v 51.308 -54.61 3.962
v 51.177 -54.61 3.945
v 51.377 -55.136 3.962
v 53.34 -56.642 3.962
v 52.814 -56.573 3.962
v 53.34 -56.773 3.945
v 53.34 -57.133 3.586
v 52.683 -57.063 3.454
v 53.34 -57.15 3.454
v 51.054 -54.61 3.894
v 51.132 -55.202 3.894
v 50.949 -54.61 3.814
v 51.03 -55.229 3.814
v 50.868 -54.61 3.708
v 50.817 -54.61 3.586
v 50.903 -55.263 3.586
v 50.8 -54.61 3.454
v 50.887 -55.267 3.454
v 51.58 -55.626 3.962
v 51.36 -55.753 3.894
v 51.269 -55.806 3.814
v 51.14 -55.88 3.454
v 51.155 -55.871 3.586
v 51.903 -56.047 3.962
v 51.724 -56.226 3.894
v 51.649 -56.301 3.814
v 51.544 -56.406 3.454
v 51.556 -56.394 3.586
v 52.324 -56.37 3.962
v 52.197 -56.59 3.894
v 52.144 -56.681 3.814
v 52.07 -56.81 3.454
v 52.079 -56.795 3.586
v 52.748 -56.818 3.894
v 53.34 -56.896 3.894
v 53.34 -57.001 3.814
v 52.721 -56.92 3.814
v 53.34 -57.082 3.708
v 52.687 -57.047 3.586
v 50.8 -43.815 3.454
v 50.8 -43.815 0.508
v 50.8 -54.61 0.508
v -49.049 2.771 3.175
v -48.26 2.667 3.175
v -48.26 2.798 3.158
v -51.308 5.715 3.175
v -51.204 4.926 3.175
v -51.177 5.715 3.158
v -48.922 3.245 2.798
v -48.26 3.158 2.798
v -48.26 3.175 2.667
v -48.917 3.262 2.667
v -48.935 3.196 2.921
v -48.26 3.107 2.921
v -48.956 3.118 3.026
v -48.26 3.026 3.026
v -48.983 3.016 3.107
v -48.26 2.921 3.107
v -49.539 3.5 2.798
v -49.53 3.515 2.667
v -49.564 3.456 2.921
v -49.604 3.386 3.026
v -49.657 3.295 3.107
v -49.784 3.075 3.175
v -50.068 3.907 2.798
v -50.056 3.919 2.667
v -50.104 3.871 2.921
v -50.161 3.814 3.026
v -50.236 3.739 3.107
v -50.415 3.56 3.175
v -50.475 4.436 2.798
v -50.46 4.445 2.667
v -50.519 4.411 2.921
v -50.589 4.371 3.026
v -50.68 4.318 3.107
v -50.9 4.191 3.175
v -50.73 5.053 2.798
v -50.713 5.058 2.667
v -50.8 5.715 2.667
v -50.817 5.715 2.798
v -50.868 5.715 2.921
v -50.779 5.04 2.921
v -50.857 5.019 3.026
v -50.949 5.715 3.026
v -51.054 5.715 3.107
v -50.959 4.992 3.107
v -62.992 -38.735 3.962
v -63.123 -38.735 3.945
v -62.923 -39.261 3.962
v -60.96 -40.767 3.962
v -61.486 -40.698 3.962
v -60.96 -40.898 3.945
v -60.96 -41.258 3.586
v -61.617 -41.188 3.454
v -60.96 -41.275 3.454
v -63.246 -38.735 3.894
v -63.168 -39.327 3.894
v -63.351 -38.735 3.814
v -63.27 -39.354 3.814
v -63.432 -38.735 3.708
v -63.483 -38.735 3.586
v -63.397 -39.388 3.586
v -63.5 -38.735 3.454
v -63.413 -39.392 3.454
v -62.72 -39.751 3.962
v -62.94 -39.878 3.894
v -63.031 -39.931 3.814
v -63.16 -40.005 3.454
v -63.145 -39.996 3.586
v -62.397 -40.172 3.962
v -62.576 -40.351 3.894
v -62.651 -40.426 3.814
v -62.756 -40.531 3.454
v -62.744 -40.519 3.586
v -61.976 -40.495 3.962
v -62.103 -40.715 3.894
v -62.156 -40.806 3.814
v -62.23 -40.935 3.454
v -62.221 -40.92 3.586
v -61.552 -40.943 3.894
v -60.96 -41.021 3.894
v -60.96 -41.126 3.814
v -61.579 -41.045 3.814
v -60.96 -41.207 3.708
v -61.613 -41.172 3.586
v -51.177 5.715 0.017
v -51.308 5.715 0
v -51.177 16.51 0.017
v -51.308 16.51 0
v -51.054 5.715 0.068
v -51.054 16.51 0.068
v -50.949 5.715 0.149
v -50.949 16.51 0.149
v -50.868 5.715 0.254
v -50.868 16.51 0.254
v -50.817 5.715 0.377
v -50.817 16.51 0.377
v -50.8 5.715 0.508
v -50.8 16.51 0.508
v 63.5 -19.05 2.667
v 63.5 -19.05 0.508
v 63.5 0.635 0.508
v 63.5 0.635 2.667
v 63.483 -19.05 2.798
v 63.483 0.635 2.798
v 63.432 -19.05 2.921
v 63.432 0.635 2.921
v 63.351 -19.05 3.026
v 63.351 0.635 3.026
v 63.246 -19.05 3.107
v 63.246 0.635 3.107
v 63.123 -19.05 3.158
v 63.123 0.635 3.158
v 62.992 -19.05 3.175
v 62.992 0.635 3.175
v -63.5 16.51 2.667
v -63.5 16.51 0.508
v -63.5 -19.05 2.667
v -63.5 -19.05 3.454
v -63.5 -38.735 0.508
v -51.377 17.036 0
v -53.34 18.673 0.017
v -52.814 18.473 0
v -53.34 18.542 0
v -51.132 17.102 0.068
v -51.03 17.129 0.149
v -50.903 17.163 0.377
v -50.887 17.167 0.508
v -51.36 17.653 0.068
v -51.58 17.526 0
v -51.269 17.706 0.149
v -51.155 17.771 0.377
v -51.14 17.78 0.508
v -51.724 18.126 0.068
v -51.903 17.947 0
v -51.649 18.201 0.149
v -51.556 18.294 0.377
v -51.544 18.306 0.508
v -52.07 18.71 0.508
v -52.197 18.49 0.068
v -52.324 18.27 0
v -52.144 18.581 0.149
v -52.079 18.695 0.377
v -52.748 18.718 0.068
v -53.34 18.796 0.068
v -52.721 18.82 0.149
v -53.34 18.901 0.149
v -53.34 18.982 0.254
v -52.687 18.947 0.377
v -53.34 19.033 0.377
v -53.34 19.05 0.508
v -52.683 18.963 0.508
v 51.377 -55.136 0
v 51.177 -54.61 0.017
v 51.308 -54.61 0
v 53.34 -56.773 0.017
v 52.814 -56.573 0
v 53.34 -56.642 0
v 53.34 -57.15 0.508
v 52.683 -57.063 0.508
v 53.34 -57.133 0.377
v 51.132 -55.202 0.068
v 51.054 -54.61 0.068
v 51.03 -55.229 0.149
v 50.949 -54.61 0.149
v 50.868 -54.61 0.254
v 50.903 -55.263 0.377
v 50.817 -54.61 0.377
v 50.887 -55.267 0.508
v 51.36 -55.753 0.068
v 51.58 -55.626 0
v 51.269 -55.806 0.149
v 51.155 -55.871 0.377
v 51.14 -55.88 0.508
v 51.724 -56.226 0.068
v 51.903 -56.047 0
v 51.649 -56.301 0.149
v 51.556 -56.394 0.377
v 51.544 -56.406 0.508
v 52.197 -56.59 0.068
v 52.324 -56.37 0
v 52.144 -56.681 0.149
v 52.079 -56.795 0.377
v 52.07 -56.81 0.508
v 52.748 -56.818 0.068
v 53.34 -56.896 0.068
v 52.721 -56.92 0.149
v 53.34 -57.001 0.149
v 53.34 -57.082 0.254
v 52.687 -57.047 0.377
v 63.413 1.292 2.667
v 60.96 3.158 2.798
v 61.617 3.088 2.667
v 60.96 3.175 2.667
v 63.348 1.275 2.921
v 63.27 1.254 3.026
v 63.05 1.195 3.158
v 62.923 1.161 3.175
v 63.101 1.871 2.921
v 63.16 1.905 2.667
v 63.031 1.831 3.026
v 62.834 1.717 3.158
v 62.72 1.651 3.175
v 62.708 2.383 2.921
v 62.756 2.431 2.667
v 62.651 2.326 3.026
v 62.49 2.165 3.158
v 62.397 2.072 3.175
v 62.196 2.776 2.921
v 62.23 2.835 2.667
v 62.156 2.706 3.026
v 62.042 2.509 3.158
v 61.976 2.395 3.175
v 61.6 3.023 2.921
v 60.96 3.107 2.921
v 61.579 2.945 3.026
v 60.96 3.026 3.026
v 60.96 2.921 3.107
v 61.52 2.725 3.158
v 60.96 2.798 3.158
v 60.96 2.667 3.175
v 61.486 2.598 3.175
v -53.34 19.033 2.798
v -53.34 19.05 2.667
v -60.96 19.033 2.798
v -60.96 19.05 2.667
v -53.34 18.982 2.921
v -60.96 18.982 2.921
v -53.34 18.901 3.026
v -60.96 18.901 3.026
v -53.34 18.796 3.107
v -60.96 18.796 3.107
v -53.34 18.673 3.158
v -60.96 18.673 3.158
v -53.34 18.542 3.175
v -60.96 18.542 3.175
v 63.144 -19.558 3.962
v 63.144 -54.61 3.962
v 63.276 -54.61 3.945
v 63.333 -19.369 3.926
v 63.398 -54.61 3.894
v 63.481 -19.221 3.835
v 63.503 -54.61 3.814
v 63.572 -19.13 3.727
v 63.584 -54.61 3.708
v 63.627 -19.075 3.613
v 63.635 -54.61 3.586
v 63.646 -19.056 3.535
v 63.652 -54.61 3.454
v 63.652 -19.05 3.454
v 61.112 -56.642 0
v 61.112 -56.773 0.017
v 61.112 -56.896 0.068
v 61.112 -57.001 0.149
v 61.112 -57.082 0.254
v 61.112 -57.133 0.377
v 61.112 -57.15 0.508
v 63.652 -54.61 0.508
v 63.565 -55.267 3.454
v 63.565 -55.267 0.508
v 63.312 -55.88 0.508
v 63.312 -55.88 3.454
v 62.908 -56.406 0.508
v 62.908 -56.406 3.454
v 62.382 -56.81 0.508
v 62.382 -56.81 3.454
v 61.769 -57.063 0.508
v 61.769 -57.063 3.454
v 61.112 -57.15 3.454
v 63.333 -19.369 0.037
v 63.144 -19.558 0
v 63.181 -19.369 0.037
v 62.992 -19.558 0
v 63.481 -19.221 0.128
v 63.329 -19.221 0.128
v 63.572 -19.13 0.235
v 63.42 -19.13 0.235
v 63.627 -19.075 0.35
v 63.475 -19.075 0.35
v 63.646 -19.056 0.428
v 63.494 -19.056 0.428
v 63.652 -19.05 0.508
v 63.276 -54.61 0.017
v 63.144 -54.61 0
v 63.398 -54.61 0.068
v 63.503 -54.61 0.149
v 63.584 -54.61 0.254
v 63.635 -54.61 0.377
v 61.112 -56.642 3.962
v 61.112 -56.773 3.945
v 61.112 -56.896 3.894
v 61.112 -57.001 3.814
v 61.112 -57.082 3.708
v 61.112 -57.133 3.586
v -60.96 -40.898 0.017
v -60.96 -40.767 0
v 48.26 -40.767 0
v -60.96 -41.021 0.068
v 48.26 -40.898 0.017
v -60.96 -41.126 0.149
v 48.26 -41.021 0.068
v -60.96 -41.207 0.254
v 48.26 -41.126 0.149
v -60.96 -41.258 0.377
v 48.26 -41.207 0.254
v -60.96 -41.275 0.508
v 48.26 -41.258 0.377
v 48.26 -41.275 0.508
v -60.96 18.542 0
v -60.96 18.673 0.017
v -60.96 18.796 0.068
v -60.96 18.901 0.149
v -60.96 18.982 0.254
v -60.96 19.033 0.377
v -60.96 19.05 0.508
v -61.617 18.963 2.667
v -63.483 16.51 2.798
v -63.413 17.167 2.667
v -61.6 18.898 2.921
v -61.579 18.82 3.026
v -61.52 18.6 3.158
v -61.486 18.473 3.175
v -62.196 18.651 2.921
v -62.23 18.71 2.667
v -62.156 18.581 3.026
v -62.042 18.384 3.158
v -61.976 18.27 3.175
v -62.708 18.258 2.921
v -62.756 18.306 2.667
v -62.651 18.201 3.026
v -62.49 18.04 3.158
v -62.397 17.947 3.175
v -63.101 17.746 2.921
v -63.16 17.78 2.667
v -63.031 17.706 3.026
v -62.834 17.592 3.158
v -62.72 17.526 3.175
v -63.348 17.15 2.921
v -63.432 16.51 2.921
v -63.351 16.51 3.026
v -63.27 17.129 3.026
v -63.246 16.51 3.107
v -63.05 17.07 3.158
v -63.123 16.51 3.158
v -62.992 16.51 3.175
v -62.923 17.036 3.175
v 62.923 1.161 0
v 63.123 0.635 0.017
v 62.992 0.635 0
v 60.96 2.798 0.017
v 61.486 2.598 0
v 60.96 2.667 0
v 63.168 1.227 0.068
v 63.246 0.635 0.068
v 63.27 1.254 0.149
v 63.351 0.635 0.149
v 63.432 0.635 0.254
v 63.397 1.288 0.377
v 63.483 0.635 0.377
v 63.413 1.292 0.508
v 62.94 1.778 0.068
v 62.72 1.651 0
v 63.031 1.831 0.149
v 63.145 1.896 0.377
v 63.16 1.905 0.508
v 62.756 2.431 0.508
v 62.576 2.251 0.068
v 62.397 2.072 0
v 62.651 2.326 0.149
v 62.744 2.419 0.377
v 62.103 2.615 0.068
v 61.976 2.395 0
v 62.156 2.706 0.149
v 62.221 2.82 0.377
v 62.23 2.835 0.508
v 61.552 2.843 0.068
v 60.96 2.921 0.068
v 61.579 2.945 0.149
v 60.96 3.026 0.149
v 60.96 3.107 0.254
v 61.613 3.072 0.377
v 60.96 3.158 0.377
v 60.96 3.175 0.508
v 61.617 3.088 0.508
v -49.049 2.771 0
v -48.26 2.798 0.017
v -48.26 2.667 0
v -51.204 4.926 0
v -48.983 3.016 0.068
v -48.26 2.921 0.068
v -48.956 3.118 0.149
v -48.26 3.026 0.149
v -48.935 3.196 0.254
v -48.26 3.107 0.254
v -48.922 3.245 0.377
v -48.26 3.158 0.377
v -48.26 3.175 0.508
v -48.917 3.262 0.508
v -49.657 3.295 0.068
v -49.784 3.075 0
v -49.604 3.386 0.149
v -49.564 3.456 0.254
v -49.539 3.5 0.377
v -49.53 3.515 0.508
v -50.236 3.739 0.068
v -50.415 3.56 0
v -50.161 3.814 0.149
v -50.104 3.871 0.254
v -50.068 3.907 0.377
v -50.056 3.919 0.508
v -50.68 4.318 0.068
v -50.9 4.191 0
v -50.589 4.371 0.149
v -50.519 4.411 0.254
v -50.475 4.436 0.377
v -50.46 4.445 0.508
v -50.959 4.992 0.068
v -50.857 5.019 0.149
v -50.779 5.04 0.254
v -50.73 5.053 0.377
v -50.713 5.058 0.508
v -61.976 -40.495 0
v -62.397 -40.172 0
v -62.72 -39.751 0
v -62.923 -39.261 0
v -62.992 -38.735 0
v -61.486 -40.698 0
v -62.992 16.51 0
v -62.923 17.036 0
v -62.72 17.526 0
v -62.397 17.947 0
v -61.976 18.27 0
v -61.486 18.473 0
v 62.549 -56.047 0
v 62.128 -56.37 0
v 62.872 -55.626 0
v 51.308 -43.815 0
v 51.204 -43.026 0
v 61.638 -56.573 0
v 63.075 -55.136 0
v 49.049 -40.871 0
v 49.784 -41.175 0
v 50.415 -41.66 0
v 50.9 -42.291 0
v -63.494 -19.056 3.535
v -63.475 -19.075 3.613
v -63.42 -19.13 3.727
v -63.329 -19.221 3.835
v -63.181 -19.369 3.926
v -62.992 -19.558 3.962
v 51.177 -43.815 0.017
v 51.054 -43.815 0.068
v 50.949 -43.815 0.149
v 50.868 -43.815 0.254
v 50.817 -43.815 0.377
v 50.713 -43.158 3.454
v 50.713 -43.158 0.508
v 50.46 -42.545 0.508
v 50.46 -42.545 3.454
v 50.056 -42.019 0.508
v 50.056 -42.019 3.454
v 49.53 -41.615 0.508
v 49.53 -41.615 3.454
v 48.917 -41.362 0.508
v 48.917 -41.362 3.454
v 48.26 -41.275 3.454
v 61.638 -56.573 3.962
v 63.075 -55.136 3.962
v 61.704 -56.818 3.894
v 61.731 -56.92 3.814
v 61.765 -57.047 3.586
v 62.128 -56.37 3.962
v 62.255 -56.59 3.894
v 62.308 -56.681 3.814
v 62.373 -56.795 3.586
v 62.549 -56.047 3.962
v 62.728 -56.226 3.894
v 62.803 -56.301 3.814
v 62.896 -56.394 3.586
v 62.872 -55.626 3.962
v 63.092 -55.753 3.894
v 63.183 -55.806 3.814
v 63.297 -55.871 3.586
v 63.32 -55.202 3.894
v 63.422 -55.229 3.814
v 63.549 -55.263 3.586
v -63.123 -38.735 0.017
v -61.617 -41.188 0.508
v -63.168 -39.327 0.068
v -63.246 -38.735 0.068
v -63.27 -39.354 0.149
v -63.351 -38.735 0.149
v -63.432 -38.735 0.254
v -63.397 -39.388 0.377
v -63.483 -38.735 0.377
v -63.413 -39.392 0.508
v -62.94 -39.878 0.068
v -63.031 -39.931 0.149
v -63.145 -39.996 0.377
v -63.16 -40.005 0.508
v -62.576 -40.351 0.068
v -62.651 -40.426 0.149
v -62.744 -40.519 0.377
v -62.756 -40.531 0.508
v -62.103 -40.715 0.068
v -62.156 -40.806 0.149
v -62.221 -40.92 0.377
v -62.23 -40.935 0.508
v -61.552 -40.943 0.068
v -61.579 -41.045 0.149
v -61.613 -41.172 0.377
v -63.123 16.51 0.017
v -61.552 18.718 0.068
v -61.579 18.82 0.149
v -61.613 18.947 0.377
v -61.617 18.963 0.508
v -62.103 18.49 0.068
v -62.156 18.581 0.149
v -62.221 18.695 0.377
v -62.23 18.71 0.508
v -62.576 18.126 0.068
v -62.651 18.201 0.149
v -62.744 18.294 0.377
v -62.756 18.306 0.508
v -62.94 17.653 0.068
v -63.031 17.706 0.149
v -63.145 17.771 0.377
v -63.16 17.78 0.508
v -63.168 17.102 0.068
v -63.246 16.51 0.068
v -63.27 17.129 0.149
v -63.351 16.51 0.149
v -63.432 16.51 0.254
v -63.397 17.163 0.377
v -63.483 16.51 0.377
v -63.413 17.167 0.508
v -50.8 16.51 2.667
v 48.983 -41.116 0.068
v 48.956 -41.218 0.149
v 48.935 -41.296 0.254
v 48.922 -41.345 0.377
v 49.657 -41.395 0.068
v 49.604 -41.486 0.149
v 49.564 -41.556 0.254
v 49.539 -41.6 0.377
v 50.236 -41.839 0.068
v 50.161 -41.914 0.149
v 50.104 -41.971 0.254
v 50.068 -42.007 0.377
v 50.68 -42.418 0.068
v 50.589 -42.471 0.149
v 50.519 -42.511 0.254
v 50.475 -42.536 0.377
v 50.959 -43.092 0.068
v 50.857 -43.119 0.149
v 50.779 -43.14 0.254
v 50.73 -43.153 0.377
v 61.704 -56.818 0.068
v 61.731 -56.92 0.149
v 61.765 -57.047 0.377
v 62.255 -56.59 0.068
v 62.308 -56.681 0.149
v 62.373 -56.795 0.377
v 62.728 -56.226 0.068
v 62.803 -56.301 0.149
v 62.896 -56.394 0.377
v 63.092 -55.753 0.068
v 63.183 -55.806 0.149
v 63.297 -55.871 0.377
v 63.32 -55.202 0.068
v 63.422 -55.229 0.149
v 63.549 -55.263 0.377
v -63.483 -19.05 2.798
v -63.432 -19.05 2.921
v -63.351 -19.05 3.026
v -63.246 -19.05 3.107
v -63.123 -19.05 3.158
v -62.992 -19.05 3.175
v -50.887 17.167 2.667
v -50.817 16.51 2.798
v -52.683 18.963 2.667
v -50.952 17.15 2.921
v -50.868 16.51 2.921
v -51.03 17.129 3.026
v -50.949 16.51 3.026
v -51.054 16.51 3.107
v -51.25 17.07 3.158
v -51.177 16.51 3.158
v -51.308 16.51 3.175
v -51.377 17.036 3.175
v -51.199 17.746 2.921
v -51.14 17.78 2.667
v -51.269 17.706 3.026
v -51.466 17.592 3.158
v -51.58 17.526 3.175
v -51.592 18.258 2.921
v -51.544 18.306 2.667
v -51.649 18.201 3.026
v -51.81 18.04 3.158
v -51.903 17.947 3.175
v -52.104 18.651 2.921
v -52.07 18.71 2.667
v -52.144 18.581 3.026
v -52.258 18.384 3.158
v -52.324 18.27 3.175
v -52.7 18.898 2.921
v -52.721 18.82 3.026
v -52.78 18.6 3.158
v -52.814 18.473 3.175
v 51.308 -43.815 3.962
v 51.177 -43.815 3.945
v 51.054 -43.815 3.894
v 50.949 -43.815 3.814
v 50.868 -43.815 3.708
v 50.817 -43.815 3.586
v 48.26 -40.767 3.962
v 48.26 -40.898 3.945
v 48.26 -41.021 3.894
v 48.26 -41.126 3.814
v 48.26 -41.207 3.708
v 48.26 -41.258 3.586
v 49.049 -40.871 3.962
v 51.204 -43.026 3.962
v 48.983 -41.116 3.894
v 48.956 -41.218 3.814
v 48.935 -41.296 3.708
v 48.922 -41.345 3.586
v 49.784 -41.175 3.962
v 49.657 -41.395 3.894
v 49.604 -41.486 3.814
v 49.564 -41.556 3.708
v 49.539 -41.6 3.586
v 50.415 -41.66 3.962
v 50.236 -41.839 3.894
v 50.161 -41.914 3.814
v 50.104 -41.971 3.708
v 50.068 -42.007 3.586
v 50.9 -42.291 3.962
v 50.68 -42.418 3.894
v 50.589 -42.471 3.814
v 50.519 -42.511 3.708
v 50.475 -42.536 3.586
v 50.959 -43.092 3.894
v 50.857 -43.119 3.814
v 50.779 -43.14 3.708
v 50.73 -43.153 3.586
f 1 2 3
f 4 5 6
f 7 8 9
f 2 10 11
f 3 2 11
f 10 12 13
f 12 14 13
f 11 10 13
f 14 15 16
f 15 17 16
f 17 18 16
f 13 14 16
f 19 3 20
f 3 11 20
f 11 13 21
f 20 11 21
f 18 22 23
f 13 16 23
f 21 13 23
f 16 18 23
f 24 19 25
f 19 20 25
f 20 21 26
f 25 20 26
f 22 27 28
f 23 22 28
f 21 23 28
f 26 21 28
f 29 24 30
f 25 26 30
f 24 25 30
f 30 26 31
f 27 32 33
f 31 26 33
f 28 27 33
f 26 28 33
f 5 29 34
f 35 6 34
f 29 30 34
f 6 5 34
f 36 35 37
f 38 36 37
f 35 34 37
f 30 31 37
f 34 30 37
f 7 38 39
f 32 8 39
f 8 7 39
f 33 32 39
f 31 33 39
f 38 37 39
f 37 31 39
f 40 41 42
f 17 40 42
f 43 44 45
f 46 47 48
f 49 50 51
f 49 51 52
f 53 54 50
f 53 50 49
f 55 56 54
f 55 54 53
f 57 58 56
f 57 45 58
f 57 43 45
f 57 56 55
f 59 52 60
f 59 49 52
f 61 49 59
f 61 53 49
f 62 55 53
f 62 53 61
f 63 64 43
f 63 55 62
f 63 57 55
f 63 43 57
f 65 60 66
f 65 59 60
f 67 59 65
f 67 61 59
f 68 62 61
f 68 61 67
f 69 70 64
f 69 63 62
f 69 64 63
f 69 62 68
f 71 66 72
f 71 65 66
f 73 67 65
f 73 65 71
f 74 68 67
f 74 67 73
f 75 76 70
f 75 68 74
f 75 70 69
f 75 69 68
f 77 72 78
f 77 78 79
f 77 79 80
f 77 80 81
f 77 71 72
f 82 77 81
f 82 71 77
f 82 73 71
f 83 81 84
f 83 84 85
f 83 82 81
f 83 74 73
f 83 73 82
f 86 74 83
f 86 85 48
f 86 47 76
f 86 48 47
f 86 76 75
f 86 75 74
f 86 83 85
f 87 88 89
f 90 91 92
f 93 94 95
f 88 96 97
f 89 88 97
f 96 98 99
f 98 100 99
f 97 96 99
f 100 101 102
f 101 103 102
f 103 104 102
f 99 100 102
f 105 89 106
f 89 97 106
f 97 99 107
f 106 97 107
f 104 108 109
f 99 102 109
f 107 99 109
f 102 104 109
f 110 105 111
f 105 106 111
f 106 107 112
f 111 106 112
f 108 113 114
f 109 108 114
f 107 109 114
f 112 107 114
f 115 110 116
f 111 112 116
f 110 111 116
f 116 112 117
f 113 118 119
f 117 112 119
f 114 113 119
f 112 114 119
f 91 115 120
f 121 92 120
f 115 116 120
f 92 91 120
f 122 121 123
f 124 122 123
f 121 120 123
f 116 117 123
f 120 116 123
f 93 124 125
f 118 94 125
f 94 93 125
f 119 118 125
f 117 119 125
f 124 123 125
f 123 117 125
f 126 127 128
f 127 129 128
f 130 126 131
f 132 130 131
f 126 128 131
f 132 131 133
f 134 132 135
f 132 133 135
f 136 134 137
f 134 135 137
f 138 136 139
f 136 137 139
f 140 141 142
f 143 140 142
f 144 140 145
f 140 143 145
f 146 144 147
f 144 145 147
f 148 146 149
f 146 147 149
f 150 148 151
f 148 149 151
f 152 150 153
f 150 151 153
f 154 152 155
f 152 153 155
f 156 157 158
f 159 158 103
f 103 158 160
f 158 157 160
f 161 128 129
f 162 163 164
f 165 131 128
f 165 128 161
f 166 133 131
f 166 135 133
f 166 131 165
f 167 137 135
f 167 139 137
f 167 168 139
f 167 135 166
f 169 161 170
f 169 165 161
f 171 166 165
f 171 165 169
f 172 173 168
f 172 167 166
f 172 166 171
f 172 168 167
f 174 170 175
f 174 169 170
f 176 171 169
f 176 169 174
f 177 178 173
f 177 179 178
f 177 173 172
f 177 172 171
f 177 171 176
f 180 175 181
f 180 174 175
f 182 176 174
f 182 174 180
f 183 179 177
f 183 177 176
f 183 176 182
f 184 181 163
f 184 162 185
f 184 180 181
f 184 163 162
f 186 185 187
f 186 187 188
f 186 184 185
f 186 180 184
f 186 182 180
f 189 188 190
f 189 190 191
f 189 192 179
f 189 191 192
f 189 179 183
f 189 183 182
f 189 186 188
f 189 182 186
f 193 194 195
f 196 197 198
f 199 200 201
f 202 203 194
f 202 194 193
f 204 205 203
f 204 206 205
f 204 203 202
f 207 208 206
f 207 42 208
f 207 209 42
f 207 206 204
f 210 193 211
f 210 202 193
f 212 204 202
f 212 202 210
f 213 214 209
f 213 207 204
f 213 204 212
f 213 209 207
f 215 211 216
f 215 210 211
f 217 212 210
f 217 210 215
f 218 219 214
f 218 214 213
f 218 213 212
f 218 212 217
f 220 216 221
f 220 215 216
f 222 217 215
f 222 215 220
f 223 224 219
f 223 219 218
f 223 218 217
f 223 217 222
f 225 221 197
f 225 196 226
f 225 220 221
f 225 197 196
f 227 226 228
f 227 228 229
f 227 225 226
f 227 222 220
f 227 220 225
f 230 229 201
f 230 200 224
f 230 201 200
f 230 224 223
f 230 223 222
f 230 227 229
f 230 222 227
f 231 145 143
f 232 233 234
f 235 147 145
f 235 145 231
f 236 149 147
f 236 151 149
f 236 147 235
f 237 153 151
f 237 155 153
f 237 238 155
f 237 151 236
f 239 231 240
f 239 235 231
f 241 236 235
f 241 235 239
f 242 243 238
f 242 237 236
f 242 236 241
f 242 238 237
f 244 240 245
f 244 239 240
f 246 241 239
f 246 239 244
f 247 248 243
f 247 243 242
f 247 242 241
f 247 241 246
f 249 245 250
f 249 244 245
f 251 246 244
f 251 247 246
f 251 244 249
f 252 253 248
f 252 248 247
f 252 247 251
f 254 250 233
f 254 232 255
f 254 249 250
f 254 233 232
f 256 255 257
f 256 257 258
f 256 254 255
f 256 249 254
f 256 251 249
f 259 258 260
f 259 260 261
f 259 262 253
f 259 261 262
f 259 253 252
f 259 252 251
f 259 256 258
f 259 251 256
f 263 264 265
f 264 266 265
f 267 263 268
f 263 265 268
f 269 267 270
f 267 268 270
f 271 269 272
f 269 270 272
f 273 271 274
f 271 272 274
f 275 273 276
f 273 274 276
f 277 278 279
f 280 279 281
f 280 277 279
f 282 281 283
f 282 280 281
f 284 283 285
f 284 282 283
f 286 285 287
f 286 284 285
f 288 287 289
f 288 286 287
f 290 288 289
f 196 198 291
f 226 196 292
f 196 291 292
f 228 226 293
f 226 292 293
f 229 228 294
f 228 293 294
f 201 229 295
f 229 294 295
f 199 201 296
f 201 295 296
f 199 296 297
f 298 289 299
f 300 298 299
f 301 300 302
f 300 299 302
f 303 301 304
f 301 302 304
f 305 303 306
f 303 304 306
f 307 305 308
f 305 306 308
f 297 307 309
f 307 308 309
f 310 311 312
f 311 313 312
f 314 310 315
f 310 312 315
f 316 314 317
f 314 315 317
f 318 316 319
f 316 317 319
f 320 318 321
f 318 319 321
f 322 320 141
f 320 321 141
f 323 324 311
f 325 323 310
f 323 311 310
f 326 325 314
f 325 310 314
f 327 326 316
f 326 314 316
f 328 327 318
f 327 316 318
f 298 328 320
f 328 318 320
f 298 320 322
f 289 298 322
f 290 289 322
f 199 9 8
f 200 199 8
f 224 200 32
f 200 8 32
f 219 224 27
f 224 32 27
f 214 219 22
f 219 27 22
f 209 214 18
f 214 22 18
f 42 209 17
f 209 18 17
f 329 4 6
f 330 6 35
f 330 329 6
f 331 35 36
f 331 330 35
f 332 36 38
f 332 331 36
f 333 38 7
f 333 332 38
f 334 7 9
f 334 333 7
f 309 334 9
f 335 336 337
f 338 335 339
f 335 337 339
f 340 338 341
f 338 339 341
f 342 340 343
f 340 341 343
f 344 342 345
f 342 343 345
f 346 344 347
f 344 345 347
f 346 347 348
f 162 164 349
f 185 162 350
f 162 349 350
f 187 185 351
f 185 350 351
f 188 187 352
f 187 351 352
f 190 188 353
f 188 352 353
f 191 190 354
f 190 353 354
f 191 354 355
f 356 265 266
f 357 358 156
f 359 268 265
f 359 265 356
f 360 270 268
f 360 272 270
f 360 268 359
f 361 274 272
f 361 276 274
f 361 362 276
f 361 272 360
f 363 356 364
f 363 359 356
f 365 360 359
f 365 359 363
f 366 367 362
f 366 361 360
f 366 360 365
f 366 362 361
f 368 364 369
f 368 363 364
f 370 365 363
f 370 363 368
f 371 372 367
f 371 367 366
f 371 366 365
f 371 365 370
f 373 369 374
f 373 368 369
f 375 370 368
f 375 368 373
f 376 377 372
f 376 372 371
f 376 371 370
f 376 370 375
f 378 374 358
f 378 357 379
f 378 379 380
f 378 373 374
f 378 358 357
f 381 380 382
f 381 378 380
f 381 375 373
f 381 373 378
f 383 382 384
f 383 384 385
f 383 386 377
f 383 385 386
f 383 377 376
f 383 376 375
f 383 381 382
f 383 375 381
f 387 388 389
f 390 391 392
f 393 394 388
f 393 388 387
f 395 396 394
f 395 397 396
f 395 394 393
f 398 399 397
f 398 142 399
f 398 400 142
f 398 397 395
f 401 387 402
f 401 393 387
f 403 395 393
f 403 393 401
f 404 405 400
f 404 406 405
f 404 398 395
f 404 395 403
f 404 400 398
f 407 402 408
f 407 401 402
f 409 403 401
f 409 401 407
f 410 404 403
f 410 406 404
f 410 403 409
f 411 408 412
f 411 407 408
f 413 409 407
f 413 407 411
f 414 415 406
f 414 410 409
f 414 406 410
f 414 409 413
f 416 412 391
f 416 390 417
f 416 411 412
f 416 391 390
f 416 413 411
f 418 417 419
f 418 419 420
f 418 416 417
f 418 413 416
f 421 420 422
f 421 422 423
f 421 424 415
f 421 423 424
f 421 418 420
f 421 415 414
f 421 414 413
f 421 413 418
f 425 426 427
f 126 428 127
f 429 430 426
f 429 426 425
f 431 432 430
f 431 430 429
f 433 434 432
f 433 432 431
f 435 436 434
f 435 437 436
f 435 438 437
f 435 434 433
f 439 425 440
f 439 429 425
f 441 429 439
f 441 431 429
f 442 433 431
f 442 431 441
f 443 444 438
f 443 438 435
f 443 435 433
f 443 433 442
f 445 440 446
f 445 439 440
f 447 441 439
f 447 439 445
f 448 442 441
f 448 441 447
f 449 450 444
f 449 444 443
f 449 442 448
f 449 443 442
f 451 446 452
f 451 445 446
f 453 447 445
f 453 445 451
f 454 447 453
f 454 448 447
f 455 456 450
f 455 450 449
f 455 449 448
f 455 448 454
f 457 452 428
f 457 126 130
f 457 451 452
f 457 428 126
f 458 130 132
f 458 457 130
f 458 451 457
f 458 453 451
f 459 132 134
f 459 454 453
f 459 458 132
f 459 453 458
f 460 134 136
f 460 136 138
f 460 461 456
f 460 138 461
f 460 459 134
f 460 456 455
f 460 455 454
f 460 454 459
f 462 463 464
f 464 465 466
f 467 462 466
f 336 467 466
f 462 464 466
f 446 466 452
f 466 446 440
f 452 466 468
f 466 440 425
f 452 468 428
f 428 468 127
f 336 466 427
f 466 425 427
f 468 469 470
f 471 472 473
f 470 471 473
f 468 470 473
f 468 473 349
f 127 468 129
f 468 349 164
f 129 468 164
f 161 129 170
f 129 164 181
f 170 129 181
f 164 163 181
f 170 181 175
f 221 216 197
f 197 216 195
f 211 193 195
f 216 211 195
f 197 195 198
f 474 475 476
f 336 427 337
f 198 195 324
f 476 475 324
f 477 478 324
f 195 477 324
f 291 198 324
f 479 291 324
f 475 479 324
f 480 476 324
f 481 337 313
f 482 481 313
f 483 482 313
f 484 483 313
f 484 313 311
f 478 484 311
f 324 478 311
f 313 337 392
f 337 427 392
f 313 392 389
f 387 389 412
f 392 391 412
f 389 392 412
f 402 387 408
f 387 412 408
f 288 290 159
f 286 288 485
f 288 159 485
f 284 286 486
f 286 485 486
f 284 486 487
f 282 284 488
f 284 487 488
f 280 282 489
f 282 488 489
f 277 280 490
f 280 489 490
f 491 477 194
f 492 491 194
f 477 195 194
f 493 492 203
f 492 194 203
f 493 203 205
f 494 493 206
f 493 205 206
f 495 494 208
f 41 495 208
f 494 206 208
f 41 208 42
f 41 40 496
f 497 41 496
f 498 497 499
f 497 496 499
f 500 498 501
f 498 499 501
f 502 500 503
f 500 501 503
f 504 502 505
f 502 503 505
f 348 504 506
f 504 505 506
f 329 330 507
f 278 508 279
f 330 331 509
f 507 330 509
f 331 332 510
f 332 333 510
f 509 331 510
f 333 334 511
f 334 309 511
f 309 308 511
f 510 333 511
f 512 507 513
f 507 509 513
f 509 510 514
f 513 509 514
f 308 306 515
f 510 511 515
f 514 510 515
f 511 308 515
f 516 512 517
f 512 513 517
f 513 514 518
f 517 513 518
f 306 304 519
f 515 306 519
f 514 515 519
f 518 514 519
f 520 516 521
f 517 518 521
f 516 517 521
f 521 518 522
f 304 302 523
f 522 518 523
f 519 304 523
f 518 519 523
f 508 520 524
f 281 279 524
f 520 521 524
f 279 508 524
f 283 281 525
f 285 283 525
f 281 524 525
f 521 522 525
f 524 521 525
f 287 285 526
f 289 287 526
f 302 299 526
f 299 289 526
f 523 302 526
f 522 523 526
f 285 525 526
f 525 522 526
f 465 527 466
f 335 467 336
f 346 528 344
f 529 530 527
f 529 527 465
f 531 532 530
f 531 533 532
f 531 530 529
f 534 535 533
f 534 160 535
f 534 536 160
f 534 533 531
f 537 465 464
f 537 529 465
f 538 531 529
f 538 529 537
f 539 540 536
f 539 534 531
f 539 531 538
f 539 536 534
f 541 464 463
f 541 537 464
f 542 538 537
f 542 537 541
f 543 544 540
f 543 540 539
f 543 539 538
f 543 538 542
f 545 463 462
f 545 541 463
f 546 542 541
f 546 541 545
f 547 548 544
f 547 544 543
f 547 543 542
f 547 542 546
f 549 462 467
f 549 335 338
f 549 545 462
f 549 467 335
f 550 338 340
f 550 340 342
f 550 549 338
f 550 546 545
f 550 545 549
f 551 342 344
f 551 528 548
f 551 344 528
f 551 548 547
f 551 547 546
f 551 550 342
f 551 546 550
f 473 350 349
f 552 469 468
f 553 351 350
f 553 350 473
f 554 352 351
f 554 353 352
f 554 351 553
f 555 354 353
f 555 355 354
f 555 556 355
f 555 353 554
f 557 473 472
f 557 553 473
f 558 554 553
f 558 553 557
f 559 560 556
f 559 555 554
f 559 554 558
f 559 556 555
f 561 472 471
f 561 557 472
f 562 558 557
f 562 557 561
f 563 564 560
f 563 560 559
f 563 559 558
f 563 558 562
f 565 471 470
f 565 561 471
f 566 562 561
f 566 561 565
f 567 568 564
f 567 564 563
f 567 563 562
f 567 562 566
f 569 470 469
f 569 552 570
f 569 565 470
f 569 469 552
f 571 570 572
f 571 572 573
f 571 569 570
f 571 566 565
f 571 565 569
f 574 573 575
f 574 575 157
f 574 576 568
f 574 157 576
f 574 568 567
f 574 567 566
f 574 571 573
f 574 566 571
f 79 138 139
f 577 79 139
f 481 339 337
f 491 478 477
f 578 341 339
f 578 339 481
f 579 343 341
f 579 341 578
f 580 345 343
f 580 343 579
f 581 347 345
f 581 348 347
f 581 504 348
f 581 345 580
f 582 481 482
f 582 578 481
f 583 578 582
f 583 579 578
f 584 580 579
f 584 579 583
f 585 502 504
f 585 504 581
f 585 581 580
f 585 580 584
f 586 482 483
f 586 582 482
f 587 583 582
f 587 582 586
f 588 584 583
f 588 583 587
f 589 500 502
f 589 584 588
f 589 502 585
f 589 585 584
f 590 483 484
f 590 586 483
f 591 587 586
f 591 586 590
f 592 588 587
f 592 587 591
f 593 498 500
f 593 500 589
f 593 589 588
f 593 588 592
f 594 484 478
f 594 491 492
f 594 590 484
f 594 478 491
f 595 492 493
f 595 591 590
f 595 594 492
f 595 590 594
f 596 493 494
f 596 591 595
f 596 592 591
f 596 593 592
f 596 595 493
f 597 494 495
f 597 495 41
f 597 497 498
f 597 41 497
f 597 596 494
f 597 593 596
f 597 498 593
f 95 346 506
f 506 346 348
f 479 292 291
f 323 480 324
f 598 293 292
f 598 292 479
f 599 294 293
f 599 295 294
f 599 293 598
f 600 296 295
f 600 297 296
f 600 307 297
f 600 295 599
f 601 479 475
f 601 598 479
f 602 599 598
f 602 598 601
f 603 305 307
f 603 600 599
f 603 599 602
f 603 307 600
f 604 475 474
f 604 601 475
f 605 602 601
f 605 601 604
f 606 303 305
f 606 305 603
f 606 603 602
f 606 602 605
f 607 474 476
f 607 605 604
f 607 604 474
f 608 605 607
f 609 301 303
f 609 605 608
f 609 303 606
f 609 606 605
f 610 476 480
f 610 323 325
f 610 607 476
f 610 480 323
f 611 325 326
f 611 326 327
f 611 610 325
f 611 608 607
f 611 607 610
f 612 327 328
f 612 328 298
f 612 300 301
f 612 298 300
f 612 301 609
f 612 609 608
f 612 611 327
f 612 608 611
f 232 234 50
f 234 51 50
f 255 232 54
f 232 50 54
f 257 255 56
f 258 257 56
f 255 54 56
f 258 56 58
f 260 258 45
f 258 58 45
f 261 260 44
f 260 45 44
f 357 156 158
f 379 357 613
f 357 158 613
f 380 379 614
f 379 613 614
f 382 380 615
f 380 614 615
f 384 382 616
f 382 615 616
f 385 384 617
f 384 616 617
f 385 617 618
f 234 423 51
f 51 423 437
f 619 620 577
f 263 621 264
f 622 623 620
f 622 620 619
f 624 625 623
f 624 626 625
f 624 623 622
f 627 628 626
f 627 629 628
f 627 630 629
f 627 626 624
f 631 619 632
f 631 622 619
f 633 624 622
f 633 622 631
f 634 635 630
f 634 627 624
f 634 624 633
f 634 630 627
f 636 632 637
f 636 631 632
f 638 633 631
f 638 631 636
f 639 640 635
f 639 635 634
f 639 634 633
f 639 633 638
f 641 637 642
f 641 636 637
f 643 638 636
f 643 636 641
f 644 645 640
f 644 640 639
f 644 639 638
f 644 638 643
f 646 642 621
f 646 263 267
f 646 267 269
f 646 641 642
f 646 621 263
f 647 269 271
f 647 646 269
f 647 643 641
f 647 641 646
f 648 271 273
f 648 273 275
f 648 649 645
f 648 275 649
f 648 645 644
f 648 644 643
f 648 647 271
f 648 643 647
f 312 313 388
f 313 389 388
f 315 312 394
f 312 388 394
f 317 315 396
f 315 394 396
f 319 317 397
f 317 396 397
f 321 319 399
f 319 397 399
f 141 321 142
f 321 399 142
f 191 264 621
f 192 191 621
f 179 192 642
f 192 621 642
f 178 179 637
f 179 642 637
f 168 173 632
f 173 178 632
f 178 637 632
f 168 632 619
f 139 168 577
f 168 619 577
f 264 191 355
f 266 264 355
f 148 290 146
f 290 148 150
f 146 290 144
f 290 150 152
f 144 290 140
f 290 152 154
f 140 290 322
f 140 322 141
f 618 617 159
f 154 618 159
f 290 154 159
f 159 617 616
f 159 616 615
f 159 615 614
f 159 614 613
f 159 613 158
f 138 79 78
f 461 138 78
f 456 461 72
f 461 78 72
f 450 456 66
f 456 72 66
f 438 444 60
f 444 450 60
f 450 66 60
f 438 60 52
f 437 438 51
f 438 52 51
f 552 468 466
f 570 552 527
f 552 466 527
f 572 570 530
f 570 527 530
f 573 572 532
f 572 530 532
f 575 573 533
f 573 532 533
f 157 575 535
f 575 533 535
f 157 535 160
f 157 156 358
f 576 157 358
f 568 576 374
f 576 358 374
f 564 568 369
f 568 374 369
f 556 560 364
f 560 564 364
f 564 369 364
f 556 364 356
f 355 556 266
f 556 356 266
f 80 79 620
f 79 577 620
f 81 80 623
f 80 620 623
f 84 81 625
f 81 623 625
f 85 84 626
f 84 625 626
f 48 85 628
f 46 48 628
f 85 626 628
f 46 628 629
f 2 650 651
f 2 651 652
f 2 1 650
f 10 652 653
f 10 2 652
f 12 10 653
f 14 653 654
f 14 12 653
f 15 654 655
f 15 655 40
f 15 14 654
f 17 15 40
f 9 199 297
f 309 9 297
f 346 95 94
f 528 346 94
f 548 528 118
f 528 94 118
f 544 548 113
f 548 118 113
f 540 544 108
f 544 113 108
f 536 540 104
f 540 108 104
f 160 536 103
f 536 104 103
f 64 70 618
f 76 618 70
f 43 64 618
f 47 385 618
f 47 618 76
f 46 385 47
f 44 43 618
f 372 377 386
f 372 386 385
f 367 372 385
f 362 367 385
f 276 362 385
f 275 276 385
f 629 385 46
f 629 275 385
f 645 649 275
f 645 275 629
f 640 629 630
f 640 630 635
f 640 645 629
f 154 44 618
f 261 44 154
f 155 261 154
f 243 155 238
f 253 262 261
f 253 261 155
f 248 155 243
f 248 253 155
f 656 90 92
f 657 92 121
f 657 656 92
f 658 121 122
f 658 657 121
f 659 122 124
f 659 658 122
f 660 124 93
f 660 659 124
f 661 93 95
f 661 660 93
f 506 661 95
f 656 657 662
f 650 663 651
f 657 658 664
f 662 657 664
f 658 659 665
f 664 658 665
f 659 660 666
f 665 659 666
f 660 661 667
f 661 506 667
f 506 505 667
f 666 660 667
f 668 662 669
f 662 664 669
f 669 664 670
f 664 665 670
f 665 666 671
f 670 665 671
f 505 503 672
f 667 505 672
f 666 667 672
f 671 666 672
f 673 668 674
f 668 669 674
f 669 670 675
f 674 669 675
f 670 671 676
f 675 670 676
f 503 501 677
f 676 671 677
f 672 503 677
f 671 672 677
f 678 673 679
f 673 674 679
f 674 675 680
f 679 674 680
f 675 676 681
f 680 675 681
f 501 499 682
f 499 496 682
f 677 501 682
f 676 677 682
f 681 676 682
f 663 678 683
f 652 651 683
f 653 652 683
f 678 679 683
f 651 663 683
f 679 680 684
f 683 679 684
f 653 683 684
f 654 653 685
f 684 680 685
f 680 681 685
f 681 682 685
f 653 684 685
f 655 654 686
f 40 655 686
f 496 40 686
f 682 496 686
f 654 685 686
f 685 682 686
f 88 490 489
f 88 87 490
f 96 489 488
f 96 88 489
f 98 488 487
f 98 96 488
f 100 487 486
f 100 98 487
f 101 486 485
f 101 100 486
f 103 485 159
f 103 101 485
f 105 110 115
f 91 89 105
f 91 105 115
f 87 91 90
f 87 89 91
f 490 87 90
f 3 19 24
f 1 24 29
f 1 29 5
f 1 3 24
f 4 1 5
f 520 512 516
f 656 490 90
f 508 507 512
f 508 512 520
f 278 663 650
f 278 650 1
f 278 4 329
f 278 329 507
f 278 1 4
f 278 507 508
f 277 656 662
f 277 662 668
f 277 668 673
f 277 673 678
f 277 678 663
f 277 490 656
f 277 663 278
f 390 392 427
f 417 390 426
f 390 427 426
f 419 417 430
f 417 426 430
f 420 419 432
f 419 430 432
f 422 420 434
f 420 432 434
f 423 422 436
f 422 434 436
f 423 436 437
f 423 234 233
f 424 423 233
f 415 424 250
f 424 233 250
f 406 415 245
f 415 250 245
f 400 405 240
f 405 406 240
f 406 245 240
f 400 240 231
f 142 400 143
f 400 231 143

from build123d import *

# Parameters (mm, degrees)
F1_DEPTH = 3.175
F2_DEPTH = 3.9624
F3_R     = 2.54
F4_R     = 0.508


with BuildPart() as f1:
    # F0 (on Top) → F1 (new body)
    with BuildSketch(Plane.XY):
        Polygon((-63.5, -19.05), (63.5, -19.05), (63.5, 3.175), (-50.8, 3.175), (-50.8, 19.05), (-63.5, 19.05), align=None)
    extrude(amount=F1_DEPTH)

    # F0 (on Top) → F2 (join)
    with BuildSketch(Plane.XY):
        Polygon((63.652039, -19.05), (63.5, -19.05), (-63.5, -19.05), (-63.5, -41.275), (50.8, -41.275), (50.8, -57.15), (63.652039, -57.15), align=None)
    extrude(amount=F2_DEPTH)

    # F3
    f3_edges = [f1.edges().sort_by_distance(p)[0] for p in [
        (-63.5, -41.275, 1.9812),
        (50.8, -41.275, 1.9812),
        (50.8, -57.15, 1.9812),
        (63.652039, -57.15, 1.9812),
        (63.5, 3.175, 1.5875),
        (-50.8, 3.175, 1.5875),
        (-50.8, 19.05, 1.5875),
        (-63.5, 19.05, 1.5875),
    ]]
    fillet(f3_edges, radius=F3_R)

    # F4
    f4_edges = [f1.edges().sort_by_distance(p)[0] for p in [
        (-63.5, -28.8925, 3.9624),
        (-62.756051, -40.531051, 3.9624),
        (0.076019, -19.05, 3.9624),
        (-6.35, -41.275, 3.9624),
        (63.652039, -36.83, 3.9624),
        (50.056051, -42.018949, 3.9624),
        (62.90809, -56.406051, 3.9624),
        (50.8, -49.2125, 3.9624),
        (57.226019, -57.15, 3.9624),
        (51.543949, -56.406051, 3.9624),
        (63.5, -9.2075, 3.175),
        (63.5, -9.2075, 0),
        (62.756051, 2.431051, 0),
        (63.576019, -19.05, 0),
        (6.35, 3.175, 0),
        (63.652039, -36.83, 0),
        (-50.056051, 3.918949, 0),
        (62.90809, -56.406051, 0),
        (-50.8, 11.1125, 0),
        (57.226019, -57.15, 0),
        (-51.543949, 18.306051, 0),
        (51.543949, -56.406051, 0),
        (-57.15, 19.05, 0),
        (50.8, -49.2125, 0),
        (-62.756051, 18.306051, 0),
        (50.056051, -42.018949, 0),
        (-63.5, -11.1125, 0),
        (-6.35, -41.275, 0),
        (-62.756051, -40.531051, 0),
    ]]
    fillet(f4_edges, radius=F4_R)


solid = f1.part
